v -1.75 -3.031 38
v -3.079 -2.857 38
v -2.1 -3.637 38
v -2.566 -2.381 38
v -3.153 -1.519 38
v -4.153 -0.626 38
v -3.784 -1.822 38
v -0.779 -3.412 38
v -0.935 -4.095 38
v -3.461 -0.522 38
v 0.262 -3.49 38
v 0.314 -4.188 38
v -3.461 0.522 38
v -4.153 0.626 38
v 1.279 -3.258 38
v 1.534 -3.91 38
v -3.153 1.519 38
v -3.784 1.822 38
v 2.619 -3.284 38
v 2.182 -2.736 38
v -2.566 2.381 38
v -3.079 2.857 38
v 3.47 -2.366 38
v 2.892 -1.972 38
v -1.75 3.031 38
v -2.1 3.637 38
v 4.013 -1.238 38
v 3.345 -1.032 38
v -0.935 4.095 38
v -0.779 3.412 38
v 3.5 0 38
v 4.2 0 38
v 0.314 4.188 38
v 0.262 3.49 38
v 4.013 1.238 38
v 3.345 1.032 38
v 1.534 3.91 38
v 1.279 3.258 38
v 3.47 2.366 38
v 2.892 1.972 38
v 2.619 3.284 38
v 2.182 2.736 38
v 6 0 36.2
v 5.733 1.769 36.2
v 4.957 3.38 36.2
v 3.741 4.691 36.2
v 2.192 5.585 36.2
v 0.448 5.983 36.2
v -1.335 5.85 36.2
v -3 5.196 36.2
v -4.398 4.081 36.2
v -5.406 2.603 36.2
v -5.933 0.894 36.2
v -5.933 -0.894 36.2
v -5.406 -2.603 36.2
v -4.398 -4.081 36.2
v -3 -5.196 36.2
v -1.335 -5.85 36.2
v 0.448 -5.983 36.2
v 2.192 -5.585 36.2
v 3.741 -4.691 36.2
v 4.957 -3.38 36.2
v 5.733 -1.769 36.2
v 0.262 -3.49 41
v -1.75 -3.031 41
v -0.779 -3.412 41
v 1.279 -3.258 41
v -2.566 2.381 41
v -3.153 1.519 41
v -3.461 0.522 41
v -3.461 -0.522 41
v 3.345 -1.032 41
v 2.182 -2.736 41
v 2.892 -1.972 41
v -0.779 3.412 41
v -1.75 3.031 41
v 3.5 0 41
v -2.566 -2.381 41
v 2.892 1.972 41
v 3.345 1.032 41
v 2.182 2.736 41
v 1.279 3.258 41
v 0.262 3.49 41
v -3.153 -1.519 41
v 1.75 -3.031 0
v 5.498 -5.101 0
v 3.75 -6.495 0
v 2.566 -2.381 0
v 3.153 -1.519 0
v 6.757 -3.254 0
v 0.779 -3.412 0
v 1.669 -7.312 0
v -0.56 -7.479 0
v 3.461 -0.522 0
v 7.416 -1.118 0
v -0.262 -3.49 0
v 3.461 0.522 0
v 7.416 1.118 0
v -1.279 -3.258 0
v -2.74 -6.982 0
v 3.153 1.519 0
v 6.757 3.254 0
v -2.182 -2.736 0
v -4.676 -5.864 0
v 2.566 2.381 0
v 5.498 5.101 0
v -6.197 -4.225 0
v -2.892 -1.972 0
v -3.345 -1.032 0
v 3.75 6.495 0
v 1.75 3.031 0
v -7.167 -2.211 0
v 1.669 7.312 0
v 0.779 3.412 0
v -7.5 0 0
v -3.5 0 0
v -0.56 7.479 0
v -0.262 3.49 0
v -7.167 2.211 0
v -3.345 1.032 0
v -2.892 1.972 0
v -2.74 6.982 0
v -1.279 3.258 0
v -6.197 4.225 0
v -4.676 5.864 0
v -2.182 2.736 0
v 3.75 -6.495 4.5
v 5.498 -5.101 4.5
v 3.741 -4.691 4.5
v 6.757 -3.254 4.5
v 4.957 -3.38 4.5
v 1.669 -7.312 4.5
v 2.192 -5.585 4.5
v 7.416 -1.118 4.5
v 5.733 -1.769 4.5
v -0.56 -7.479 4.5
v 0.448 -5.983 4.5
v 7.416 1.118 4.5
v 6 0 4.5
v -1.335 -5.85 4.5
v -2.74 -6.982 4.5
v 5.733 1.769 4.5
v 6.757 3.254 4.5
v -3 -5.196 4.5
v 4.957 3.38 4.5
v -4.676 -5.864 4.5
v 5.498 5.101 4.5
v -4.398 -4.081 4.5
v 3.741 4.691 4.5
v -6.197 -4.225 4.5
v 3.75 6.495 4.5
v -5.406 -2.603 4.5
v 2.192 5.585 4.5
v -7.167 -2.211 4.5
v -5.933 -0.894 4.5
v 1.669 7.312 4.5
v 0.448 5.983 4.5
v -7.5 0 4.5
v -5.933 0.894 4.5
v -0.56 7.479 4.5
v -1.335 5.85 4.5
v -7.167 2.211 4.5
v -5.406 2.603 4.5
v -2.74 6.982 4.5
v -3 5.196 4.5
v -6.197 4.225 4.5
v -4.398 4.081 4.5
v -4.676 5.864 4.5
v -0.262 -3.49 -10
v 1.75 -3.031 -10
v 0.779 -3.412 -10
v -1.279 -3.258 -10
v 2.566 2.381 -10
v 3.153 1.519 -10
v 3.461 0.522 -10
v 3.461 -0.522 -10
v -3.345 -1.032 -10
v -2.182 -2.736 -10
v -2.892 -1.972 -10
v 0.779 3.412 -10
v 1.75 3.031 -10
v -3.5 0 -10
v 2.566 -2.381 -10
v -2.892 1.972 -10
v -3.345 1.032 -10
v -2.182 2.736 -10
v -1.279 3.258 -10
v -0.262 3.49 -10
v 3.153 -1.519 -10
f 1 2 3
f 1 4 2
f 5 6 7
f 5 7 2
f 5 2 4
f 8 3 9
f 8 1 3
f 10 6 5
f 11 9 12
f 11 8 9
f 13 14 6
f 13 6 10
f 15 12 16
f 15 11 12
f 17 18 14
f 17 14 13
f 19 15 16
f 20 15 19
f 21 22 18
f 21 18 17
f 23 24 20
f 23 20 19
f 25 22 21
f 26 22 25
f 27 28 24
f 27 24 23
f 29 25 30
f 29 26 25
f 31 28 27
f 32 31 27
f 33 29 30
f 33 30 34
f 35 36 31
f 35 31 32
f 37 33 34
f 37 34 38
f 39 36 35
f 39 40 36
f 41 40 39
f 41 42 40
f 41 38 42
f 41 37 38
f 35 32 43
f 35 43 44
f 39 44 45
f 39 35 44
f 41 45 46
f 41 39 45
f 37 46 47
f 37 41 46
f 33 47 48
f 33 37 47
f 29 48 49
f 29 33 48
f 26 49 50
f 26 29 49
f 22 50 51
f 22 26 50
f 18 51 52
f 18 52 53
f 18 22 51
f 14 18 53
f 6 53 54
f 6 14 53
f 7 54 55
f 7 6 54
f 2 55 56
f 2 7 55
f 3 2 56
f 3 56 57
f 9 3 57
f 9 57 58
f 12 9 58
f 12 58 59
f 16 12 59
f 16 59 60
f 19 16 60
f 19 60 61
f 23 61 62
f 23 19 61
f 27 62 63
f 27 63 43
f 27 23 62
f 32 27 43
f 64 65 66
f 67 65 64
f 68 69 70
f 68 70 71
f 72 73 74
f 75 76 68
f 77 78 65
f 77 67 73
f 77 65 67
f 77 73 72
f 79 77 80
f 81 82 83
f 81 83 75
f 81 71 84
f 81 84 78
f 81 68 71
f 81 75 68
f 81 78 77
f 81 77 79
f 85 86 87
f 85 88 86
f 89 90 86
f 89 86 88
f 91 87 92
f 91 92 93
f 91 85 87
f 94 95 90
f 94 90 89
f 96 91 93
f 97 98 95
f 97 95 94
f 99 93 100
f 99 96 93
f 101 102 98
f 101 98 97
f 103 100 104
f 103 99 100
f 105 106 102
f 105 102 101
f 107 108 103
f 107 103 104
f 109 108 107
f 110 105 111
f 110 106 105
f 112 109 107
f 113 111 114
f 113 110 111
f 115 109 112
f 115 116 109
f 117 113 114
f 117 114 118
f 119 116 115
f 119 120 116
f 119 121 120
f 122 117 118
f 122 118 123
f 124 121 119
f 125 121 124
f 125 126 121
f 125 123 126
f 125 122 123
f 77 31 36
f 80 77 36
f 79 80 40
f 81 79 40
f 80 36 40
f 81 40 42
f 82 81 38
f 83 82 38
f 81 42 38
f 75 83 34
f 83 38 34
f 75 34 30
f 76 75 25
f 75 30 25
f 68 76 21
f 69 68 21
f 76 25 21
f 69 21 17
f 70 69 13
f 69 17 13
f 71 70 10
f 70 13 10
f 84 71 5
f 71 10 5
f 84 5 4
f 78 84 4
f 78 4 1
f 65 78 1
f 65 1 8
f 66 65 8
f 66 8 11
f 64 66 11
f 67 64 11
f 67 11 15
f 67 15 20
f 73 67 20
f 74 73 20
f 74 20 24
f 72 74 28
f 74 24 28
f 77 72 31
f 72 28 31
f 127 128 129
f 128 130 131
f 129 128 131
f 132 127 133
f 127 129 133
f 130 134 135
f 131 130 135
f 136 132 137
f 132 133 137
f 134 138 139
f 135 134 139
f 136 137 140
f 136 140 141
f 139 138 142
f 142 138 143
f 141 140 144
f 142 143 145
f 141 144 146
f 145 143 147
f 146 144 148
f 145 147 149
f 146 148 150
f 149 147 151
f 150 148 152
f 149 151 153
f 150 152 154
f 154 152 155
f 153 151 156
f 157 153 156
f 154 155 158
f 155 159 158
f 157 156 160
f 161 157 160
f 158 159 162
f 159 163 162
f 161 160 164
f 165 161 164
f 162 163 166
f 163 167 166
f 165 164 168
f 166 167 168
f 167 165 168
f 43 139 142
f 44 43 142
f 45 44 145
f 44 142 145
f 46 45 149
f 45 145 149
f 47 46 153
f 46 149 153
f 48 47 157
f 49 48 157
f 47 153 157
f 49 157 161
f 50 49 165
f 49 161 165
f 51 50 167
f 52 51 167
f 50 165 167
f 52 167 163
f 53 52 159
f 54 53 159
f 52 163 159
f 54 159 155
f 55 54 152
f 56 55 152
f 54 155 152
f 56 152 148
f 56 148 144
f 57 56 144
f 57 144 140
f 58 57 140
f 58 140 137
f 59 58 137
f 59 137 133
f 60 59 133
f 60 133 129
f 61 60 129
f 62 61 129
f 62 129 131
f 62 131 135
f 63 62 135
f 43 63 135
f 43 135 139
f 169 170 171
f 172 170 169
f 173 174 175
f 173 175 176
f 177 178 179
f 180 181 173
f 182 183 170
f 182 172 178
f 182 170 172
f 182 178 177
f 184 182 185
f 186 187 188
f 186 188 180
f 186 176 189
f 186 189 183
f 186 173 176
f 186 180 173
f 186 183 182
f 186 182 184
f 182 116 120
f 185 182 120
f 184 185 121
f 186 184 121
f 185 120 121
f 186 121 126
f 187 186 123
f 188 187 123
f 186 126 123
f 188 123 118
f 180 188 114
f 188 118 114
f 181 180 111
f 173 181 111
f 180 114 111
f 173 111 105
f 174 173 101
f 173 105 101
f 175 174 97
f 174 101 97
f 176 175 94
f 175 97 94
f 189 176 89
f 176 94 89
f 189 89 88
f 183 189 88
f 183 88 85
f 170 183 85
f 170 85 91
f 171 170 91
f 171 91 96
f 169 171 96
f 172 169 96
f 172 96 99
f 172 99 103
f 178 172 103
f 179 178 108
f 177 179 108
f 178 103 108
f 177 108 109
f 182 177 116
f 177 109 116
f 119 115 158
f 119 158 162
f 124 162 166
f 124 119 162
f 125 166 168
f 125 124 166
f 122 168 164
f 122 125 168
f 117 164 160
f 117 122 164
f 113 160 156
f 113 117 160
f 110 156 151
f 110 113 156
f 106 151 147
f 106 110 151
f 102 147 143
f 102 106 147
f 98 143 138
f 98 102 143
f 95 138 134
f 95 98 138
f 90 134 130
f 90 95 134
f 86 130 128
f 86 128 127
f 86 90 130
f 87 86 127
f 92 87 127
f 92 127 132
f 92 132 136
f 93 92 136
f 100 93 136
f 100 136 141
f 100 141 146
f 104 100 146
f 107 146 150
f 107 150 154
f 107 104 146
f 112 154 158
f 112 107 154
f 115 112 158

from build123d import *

# Parameters (mm, degrees)
SKETCH_1_R      = 6
EXTRUDE_1_DEPTH = 38
SKETCH_2_R      = 3.5
EXTRUDE_2_DEPTH = 3
SKETCH_4_R      = 3.5
EXTRUDE_3_DEPTH = 10
SKETCH_6_R      = 7.5
EXTRUDE_5_DEPTH = 4.5
CHAMFER_1_SIZE  = 1.8


with BuildPart() as part:
    # Эскиз1 → Бобышка-Вытянуть1 (new body)
    with BuildSketch(Plane.XY):
        Circle(SKETCH_1_R)
    extrude(amount=EXTRUDE_1_DEPTH)

    # Эскиз2 → Бобышка-Вытянуть2 (add)
    with BuildSketch(Plane.XY.offset(38)):
        Circle(SKETCH_2_R)
    extrude(amount=EXTRUDE_2_DEPTH)

    # Эскиз4 → Бобышка-Вытянуть3 (add)
    with BuildSketch(Plane(origin=(0, 0, 0), x_dir=(-1, 0, 0), z_dir=(0, 0, -1))):
        Circle(SKETCH_4_R)
    extrude(amount=EXTRUDE_3_DEPTH)

    # Эскиз6 → Бобышка-Вытянуть5 (add)
    with BuildSketch(Plane(origin=(0, 0, 0), x_dir=(-1, 0, 0), z_dir=(0, 0, -1))):
        Circle(SKETCH_6_R)
    extrude(amount=-EXTRUDE_5_DEPTH)

    # Фаска1
    chamfer_1_edges = [part.edges().sort_by_distance(p)[0] for p in [
        (-6, 0, 38),
    ]]
    chamfer(chamfer_1_edges, length=CHAMFER_1_SIZE)


solid = part.part
